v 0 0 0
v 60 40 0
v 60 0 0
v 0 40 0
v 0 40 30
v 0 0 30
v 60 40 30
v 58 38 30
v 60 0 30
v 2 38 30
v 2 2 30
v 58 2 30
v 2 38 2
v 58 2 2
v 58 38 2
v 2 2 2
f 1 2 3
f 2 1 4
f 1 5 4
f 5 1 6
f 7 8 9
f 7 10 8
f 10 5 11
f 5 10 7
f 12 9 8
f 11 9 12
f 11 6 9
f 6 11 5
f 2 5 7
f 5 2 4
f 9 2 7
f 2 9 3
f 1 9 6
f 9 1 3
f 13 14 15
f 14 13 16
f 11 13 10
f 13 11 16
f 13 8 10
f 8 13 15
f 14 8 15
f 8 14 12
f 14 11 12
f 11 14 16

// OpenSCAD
/* [Dimensions] */
// Width of the box (mm)
width = 60; // [20:200]
// Depth of the box (mm)
depth = 40; // [20:200]
// Height of the box (mm)
height = 30; // [10:150]
// Wall thickness (mm)
wall = 2; // [1:0.5:6]

/* [Options] */
// Add a flat lid next to the box
with_lid = false;
// Corner style
corner_style = "sharp"; // [sharp:Sharp, rounded:Rounded]

/* [Hidden] */
$fn = 48;

module rounded_rect(size, r) {
    if (r <= 0) {
        square([size[0], size[1]]);
    } else {
        hull() {
            for (x = [r, size[0] - r])
                for (y = [r, size[1] - r])
                    translate([x, y]) circle(r = r);
        }
    }
}

module box() {
    r = corner_style == "rounded" ? min(8, wall * 2 + 2) : 0;
    difference() {
        linear_extrude(height = height)
            rounded_rect([width, depth], r);
        translate([wall, wall, wall])
            linear_extrude(height = height)
                rounded_rect([width - wall * 2, depth - wall * 2], max(r - wall, 0));
    }
}

box();

if (with_lid) {
    translate([0, depth + 10, 0])
        linear_extrude(height = wall)
            square([width, depth]);
}
